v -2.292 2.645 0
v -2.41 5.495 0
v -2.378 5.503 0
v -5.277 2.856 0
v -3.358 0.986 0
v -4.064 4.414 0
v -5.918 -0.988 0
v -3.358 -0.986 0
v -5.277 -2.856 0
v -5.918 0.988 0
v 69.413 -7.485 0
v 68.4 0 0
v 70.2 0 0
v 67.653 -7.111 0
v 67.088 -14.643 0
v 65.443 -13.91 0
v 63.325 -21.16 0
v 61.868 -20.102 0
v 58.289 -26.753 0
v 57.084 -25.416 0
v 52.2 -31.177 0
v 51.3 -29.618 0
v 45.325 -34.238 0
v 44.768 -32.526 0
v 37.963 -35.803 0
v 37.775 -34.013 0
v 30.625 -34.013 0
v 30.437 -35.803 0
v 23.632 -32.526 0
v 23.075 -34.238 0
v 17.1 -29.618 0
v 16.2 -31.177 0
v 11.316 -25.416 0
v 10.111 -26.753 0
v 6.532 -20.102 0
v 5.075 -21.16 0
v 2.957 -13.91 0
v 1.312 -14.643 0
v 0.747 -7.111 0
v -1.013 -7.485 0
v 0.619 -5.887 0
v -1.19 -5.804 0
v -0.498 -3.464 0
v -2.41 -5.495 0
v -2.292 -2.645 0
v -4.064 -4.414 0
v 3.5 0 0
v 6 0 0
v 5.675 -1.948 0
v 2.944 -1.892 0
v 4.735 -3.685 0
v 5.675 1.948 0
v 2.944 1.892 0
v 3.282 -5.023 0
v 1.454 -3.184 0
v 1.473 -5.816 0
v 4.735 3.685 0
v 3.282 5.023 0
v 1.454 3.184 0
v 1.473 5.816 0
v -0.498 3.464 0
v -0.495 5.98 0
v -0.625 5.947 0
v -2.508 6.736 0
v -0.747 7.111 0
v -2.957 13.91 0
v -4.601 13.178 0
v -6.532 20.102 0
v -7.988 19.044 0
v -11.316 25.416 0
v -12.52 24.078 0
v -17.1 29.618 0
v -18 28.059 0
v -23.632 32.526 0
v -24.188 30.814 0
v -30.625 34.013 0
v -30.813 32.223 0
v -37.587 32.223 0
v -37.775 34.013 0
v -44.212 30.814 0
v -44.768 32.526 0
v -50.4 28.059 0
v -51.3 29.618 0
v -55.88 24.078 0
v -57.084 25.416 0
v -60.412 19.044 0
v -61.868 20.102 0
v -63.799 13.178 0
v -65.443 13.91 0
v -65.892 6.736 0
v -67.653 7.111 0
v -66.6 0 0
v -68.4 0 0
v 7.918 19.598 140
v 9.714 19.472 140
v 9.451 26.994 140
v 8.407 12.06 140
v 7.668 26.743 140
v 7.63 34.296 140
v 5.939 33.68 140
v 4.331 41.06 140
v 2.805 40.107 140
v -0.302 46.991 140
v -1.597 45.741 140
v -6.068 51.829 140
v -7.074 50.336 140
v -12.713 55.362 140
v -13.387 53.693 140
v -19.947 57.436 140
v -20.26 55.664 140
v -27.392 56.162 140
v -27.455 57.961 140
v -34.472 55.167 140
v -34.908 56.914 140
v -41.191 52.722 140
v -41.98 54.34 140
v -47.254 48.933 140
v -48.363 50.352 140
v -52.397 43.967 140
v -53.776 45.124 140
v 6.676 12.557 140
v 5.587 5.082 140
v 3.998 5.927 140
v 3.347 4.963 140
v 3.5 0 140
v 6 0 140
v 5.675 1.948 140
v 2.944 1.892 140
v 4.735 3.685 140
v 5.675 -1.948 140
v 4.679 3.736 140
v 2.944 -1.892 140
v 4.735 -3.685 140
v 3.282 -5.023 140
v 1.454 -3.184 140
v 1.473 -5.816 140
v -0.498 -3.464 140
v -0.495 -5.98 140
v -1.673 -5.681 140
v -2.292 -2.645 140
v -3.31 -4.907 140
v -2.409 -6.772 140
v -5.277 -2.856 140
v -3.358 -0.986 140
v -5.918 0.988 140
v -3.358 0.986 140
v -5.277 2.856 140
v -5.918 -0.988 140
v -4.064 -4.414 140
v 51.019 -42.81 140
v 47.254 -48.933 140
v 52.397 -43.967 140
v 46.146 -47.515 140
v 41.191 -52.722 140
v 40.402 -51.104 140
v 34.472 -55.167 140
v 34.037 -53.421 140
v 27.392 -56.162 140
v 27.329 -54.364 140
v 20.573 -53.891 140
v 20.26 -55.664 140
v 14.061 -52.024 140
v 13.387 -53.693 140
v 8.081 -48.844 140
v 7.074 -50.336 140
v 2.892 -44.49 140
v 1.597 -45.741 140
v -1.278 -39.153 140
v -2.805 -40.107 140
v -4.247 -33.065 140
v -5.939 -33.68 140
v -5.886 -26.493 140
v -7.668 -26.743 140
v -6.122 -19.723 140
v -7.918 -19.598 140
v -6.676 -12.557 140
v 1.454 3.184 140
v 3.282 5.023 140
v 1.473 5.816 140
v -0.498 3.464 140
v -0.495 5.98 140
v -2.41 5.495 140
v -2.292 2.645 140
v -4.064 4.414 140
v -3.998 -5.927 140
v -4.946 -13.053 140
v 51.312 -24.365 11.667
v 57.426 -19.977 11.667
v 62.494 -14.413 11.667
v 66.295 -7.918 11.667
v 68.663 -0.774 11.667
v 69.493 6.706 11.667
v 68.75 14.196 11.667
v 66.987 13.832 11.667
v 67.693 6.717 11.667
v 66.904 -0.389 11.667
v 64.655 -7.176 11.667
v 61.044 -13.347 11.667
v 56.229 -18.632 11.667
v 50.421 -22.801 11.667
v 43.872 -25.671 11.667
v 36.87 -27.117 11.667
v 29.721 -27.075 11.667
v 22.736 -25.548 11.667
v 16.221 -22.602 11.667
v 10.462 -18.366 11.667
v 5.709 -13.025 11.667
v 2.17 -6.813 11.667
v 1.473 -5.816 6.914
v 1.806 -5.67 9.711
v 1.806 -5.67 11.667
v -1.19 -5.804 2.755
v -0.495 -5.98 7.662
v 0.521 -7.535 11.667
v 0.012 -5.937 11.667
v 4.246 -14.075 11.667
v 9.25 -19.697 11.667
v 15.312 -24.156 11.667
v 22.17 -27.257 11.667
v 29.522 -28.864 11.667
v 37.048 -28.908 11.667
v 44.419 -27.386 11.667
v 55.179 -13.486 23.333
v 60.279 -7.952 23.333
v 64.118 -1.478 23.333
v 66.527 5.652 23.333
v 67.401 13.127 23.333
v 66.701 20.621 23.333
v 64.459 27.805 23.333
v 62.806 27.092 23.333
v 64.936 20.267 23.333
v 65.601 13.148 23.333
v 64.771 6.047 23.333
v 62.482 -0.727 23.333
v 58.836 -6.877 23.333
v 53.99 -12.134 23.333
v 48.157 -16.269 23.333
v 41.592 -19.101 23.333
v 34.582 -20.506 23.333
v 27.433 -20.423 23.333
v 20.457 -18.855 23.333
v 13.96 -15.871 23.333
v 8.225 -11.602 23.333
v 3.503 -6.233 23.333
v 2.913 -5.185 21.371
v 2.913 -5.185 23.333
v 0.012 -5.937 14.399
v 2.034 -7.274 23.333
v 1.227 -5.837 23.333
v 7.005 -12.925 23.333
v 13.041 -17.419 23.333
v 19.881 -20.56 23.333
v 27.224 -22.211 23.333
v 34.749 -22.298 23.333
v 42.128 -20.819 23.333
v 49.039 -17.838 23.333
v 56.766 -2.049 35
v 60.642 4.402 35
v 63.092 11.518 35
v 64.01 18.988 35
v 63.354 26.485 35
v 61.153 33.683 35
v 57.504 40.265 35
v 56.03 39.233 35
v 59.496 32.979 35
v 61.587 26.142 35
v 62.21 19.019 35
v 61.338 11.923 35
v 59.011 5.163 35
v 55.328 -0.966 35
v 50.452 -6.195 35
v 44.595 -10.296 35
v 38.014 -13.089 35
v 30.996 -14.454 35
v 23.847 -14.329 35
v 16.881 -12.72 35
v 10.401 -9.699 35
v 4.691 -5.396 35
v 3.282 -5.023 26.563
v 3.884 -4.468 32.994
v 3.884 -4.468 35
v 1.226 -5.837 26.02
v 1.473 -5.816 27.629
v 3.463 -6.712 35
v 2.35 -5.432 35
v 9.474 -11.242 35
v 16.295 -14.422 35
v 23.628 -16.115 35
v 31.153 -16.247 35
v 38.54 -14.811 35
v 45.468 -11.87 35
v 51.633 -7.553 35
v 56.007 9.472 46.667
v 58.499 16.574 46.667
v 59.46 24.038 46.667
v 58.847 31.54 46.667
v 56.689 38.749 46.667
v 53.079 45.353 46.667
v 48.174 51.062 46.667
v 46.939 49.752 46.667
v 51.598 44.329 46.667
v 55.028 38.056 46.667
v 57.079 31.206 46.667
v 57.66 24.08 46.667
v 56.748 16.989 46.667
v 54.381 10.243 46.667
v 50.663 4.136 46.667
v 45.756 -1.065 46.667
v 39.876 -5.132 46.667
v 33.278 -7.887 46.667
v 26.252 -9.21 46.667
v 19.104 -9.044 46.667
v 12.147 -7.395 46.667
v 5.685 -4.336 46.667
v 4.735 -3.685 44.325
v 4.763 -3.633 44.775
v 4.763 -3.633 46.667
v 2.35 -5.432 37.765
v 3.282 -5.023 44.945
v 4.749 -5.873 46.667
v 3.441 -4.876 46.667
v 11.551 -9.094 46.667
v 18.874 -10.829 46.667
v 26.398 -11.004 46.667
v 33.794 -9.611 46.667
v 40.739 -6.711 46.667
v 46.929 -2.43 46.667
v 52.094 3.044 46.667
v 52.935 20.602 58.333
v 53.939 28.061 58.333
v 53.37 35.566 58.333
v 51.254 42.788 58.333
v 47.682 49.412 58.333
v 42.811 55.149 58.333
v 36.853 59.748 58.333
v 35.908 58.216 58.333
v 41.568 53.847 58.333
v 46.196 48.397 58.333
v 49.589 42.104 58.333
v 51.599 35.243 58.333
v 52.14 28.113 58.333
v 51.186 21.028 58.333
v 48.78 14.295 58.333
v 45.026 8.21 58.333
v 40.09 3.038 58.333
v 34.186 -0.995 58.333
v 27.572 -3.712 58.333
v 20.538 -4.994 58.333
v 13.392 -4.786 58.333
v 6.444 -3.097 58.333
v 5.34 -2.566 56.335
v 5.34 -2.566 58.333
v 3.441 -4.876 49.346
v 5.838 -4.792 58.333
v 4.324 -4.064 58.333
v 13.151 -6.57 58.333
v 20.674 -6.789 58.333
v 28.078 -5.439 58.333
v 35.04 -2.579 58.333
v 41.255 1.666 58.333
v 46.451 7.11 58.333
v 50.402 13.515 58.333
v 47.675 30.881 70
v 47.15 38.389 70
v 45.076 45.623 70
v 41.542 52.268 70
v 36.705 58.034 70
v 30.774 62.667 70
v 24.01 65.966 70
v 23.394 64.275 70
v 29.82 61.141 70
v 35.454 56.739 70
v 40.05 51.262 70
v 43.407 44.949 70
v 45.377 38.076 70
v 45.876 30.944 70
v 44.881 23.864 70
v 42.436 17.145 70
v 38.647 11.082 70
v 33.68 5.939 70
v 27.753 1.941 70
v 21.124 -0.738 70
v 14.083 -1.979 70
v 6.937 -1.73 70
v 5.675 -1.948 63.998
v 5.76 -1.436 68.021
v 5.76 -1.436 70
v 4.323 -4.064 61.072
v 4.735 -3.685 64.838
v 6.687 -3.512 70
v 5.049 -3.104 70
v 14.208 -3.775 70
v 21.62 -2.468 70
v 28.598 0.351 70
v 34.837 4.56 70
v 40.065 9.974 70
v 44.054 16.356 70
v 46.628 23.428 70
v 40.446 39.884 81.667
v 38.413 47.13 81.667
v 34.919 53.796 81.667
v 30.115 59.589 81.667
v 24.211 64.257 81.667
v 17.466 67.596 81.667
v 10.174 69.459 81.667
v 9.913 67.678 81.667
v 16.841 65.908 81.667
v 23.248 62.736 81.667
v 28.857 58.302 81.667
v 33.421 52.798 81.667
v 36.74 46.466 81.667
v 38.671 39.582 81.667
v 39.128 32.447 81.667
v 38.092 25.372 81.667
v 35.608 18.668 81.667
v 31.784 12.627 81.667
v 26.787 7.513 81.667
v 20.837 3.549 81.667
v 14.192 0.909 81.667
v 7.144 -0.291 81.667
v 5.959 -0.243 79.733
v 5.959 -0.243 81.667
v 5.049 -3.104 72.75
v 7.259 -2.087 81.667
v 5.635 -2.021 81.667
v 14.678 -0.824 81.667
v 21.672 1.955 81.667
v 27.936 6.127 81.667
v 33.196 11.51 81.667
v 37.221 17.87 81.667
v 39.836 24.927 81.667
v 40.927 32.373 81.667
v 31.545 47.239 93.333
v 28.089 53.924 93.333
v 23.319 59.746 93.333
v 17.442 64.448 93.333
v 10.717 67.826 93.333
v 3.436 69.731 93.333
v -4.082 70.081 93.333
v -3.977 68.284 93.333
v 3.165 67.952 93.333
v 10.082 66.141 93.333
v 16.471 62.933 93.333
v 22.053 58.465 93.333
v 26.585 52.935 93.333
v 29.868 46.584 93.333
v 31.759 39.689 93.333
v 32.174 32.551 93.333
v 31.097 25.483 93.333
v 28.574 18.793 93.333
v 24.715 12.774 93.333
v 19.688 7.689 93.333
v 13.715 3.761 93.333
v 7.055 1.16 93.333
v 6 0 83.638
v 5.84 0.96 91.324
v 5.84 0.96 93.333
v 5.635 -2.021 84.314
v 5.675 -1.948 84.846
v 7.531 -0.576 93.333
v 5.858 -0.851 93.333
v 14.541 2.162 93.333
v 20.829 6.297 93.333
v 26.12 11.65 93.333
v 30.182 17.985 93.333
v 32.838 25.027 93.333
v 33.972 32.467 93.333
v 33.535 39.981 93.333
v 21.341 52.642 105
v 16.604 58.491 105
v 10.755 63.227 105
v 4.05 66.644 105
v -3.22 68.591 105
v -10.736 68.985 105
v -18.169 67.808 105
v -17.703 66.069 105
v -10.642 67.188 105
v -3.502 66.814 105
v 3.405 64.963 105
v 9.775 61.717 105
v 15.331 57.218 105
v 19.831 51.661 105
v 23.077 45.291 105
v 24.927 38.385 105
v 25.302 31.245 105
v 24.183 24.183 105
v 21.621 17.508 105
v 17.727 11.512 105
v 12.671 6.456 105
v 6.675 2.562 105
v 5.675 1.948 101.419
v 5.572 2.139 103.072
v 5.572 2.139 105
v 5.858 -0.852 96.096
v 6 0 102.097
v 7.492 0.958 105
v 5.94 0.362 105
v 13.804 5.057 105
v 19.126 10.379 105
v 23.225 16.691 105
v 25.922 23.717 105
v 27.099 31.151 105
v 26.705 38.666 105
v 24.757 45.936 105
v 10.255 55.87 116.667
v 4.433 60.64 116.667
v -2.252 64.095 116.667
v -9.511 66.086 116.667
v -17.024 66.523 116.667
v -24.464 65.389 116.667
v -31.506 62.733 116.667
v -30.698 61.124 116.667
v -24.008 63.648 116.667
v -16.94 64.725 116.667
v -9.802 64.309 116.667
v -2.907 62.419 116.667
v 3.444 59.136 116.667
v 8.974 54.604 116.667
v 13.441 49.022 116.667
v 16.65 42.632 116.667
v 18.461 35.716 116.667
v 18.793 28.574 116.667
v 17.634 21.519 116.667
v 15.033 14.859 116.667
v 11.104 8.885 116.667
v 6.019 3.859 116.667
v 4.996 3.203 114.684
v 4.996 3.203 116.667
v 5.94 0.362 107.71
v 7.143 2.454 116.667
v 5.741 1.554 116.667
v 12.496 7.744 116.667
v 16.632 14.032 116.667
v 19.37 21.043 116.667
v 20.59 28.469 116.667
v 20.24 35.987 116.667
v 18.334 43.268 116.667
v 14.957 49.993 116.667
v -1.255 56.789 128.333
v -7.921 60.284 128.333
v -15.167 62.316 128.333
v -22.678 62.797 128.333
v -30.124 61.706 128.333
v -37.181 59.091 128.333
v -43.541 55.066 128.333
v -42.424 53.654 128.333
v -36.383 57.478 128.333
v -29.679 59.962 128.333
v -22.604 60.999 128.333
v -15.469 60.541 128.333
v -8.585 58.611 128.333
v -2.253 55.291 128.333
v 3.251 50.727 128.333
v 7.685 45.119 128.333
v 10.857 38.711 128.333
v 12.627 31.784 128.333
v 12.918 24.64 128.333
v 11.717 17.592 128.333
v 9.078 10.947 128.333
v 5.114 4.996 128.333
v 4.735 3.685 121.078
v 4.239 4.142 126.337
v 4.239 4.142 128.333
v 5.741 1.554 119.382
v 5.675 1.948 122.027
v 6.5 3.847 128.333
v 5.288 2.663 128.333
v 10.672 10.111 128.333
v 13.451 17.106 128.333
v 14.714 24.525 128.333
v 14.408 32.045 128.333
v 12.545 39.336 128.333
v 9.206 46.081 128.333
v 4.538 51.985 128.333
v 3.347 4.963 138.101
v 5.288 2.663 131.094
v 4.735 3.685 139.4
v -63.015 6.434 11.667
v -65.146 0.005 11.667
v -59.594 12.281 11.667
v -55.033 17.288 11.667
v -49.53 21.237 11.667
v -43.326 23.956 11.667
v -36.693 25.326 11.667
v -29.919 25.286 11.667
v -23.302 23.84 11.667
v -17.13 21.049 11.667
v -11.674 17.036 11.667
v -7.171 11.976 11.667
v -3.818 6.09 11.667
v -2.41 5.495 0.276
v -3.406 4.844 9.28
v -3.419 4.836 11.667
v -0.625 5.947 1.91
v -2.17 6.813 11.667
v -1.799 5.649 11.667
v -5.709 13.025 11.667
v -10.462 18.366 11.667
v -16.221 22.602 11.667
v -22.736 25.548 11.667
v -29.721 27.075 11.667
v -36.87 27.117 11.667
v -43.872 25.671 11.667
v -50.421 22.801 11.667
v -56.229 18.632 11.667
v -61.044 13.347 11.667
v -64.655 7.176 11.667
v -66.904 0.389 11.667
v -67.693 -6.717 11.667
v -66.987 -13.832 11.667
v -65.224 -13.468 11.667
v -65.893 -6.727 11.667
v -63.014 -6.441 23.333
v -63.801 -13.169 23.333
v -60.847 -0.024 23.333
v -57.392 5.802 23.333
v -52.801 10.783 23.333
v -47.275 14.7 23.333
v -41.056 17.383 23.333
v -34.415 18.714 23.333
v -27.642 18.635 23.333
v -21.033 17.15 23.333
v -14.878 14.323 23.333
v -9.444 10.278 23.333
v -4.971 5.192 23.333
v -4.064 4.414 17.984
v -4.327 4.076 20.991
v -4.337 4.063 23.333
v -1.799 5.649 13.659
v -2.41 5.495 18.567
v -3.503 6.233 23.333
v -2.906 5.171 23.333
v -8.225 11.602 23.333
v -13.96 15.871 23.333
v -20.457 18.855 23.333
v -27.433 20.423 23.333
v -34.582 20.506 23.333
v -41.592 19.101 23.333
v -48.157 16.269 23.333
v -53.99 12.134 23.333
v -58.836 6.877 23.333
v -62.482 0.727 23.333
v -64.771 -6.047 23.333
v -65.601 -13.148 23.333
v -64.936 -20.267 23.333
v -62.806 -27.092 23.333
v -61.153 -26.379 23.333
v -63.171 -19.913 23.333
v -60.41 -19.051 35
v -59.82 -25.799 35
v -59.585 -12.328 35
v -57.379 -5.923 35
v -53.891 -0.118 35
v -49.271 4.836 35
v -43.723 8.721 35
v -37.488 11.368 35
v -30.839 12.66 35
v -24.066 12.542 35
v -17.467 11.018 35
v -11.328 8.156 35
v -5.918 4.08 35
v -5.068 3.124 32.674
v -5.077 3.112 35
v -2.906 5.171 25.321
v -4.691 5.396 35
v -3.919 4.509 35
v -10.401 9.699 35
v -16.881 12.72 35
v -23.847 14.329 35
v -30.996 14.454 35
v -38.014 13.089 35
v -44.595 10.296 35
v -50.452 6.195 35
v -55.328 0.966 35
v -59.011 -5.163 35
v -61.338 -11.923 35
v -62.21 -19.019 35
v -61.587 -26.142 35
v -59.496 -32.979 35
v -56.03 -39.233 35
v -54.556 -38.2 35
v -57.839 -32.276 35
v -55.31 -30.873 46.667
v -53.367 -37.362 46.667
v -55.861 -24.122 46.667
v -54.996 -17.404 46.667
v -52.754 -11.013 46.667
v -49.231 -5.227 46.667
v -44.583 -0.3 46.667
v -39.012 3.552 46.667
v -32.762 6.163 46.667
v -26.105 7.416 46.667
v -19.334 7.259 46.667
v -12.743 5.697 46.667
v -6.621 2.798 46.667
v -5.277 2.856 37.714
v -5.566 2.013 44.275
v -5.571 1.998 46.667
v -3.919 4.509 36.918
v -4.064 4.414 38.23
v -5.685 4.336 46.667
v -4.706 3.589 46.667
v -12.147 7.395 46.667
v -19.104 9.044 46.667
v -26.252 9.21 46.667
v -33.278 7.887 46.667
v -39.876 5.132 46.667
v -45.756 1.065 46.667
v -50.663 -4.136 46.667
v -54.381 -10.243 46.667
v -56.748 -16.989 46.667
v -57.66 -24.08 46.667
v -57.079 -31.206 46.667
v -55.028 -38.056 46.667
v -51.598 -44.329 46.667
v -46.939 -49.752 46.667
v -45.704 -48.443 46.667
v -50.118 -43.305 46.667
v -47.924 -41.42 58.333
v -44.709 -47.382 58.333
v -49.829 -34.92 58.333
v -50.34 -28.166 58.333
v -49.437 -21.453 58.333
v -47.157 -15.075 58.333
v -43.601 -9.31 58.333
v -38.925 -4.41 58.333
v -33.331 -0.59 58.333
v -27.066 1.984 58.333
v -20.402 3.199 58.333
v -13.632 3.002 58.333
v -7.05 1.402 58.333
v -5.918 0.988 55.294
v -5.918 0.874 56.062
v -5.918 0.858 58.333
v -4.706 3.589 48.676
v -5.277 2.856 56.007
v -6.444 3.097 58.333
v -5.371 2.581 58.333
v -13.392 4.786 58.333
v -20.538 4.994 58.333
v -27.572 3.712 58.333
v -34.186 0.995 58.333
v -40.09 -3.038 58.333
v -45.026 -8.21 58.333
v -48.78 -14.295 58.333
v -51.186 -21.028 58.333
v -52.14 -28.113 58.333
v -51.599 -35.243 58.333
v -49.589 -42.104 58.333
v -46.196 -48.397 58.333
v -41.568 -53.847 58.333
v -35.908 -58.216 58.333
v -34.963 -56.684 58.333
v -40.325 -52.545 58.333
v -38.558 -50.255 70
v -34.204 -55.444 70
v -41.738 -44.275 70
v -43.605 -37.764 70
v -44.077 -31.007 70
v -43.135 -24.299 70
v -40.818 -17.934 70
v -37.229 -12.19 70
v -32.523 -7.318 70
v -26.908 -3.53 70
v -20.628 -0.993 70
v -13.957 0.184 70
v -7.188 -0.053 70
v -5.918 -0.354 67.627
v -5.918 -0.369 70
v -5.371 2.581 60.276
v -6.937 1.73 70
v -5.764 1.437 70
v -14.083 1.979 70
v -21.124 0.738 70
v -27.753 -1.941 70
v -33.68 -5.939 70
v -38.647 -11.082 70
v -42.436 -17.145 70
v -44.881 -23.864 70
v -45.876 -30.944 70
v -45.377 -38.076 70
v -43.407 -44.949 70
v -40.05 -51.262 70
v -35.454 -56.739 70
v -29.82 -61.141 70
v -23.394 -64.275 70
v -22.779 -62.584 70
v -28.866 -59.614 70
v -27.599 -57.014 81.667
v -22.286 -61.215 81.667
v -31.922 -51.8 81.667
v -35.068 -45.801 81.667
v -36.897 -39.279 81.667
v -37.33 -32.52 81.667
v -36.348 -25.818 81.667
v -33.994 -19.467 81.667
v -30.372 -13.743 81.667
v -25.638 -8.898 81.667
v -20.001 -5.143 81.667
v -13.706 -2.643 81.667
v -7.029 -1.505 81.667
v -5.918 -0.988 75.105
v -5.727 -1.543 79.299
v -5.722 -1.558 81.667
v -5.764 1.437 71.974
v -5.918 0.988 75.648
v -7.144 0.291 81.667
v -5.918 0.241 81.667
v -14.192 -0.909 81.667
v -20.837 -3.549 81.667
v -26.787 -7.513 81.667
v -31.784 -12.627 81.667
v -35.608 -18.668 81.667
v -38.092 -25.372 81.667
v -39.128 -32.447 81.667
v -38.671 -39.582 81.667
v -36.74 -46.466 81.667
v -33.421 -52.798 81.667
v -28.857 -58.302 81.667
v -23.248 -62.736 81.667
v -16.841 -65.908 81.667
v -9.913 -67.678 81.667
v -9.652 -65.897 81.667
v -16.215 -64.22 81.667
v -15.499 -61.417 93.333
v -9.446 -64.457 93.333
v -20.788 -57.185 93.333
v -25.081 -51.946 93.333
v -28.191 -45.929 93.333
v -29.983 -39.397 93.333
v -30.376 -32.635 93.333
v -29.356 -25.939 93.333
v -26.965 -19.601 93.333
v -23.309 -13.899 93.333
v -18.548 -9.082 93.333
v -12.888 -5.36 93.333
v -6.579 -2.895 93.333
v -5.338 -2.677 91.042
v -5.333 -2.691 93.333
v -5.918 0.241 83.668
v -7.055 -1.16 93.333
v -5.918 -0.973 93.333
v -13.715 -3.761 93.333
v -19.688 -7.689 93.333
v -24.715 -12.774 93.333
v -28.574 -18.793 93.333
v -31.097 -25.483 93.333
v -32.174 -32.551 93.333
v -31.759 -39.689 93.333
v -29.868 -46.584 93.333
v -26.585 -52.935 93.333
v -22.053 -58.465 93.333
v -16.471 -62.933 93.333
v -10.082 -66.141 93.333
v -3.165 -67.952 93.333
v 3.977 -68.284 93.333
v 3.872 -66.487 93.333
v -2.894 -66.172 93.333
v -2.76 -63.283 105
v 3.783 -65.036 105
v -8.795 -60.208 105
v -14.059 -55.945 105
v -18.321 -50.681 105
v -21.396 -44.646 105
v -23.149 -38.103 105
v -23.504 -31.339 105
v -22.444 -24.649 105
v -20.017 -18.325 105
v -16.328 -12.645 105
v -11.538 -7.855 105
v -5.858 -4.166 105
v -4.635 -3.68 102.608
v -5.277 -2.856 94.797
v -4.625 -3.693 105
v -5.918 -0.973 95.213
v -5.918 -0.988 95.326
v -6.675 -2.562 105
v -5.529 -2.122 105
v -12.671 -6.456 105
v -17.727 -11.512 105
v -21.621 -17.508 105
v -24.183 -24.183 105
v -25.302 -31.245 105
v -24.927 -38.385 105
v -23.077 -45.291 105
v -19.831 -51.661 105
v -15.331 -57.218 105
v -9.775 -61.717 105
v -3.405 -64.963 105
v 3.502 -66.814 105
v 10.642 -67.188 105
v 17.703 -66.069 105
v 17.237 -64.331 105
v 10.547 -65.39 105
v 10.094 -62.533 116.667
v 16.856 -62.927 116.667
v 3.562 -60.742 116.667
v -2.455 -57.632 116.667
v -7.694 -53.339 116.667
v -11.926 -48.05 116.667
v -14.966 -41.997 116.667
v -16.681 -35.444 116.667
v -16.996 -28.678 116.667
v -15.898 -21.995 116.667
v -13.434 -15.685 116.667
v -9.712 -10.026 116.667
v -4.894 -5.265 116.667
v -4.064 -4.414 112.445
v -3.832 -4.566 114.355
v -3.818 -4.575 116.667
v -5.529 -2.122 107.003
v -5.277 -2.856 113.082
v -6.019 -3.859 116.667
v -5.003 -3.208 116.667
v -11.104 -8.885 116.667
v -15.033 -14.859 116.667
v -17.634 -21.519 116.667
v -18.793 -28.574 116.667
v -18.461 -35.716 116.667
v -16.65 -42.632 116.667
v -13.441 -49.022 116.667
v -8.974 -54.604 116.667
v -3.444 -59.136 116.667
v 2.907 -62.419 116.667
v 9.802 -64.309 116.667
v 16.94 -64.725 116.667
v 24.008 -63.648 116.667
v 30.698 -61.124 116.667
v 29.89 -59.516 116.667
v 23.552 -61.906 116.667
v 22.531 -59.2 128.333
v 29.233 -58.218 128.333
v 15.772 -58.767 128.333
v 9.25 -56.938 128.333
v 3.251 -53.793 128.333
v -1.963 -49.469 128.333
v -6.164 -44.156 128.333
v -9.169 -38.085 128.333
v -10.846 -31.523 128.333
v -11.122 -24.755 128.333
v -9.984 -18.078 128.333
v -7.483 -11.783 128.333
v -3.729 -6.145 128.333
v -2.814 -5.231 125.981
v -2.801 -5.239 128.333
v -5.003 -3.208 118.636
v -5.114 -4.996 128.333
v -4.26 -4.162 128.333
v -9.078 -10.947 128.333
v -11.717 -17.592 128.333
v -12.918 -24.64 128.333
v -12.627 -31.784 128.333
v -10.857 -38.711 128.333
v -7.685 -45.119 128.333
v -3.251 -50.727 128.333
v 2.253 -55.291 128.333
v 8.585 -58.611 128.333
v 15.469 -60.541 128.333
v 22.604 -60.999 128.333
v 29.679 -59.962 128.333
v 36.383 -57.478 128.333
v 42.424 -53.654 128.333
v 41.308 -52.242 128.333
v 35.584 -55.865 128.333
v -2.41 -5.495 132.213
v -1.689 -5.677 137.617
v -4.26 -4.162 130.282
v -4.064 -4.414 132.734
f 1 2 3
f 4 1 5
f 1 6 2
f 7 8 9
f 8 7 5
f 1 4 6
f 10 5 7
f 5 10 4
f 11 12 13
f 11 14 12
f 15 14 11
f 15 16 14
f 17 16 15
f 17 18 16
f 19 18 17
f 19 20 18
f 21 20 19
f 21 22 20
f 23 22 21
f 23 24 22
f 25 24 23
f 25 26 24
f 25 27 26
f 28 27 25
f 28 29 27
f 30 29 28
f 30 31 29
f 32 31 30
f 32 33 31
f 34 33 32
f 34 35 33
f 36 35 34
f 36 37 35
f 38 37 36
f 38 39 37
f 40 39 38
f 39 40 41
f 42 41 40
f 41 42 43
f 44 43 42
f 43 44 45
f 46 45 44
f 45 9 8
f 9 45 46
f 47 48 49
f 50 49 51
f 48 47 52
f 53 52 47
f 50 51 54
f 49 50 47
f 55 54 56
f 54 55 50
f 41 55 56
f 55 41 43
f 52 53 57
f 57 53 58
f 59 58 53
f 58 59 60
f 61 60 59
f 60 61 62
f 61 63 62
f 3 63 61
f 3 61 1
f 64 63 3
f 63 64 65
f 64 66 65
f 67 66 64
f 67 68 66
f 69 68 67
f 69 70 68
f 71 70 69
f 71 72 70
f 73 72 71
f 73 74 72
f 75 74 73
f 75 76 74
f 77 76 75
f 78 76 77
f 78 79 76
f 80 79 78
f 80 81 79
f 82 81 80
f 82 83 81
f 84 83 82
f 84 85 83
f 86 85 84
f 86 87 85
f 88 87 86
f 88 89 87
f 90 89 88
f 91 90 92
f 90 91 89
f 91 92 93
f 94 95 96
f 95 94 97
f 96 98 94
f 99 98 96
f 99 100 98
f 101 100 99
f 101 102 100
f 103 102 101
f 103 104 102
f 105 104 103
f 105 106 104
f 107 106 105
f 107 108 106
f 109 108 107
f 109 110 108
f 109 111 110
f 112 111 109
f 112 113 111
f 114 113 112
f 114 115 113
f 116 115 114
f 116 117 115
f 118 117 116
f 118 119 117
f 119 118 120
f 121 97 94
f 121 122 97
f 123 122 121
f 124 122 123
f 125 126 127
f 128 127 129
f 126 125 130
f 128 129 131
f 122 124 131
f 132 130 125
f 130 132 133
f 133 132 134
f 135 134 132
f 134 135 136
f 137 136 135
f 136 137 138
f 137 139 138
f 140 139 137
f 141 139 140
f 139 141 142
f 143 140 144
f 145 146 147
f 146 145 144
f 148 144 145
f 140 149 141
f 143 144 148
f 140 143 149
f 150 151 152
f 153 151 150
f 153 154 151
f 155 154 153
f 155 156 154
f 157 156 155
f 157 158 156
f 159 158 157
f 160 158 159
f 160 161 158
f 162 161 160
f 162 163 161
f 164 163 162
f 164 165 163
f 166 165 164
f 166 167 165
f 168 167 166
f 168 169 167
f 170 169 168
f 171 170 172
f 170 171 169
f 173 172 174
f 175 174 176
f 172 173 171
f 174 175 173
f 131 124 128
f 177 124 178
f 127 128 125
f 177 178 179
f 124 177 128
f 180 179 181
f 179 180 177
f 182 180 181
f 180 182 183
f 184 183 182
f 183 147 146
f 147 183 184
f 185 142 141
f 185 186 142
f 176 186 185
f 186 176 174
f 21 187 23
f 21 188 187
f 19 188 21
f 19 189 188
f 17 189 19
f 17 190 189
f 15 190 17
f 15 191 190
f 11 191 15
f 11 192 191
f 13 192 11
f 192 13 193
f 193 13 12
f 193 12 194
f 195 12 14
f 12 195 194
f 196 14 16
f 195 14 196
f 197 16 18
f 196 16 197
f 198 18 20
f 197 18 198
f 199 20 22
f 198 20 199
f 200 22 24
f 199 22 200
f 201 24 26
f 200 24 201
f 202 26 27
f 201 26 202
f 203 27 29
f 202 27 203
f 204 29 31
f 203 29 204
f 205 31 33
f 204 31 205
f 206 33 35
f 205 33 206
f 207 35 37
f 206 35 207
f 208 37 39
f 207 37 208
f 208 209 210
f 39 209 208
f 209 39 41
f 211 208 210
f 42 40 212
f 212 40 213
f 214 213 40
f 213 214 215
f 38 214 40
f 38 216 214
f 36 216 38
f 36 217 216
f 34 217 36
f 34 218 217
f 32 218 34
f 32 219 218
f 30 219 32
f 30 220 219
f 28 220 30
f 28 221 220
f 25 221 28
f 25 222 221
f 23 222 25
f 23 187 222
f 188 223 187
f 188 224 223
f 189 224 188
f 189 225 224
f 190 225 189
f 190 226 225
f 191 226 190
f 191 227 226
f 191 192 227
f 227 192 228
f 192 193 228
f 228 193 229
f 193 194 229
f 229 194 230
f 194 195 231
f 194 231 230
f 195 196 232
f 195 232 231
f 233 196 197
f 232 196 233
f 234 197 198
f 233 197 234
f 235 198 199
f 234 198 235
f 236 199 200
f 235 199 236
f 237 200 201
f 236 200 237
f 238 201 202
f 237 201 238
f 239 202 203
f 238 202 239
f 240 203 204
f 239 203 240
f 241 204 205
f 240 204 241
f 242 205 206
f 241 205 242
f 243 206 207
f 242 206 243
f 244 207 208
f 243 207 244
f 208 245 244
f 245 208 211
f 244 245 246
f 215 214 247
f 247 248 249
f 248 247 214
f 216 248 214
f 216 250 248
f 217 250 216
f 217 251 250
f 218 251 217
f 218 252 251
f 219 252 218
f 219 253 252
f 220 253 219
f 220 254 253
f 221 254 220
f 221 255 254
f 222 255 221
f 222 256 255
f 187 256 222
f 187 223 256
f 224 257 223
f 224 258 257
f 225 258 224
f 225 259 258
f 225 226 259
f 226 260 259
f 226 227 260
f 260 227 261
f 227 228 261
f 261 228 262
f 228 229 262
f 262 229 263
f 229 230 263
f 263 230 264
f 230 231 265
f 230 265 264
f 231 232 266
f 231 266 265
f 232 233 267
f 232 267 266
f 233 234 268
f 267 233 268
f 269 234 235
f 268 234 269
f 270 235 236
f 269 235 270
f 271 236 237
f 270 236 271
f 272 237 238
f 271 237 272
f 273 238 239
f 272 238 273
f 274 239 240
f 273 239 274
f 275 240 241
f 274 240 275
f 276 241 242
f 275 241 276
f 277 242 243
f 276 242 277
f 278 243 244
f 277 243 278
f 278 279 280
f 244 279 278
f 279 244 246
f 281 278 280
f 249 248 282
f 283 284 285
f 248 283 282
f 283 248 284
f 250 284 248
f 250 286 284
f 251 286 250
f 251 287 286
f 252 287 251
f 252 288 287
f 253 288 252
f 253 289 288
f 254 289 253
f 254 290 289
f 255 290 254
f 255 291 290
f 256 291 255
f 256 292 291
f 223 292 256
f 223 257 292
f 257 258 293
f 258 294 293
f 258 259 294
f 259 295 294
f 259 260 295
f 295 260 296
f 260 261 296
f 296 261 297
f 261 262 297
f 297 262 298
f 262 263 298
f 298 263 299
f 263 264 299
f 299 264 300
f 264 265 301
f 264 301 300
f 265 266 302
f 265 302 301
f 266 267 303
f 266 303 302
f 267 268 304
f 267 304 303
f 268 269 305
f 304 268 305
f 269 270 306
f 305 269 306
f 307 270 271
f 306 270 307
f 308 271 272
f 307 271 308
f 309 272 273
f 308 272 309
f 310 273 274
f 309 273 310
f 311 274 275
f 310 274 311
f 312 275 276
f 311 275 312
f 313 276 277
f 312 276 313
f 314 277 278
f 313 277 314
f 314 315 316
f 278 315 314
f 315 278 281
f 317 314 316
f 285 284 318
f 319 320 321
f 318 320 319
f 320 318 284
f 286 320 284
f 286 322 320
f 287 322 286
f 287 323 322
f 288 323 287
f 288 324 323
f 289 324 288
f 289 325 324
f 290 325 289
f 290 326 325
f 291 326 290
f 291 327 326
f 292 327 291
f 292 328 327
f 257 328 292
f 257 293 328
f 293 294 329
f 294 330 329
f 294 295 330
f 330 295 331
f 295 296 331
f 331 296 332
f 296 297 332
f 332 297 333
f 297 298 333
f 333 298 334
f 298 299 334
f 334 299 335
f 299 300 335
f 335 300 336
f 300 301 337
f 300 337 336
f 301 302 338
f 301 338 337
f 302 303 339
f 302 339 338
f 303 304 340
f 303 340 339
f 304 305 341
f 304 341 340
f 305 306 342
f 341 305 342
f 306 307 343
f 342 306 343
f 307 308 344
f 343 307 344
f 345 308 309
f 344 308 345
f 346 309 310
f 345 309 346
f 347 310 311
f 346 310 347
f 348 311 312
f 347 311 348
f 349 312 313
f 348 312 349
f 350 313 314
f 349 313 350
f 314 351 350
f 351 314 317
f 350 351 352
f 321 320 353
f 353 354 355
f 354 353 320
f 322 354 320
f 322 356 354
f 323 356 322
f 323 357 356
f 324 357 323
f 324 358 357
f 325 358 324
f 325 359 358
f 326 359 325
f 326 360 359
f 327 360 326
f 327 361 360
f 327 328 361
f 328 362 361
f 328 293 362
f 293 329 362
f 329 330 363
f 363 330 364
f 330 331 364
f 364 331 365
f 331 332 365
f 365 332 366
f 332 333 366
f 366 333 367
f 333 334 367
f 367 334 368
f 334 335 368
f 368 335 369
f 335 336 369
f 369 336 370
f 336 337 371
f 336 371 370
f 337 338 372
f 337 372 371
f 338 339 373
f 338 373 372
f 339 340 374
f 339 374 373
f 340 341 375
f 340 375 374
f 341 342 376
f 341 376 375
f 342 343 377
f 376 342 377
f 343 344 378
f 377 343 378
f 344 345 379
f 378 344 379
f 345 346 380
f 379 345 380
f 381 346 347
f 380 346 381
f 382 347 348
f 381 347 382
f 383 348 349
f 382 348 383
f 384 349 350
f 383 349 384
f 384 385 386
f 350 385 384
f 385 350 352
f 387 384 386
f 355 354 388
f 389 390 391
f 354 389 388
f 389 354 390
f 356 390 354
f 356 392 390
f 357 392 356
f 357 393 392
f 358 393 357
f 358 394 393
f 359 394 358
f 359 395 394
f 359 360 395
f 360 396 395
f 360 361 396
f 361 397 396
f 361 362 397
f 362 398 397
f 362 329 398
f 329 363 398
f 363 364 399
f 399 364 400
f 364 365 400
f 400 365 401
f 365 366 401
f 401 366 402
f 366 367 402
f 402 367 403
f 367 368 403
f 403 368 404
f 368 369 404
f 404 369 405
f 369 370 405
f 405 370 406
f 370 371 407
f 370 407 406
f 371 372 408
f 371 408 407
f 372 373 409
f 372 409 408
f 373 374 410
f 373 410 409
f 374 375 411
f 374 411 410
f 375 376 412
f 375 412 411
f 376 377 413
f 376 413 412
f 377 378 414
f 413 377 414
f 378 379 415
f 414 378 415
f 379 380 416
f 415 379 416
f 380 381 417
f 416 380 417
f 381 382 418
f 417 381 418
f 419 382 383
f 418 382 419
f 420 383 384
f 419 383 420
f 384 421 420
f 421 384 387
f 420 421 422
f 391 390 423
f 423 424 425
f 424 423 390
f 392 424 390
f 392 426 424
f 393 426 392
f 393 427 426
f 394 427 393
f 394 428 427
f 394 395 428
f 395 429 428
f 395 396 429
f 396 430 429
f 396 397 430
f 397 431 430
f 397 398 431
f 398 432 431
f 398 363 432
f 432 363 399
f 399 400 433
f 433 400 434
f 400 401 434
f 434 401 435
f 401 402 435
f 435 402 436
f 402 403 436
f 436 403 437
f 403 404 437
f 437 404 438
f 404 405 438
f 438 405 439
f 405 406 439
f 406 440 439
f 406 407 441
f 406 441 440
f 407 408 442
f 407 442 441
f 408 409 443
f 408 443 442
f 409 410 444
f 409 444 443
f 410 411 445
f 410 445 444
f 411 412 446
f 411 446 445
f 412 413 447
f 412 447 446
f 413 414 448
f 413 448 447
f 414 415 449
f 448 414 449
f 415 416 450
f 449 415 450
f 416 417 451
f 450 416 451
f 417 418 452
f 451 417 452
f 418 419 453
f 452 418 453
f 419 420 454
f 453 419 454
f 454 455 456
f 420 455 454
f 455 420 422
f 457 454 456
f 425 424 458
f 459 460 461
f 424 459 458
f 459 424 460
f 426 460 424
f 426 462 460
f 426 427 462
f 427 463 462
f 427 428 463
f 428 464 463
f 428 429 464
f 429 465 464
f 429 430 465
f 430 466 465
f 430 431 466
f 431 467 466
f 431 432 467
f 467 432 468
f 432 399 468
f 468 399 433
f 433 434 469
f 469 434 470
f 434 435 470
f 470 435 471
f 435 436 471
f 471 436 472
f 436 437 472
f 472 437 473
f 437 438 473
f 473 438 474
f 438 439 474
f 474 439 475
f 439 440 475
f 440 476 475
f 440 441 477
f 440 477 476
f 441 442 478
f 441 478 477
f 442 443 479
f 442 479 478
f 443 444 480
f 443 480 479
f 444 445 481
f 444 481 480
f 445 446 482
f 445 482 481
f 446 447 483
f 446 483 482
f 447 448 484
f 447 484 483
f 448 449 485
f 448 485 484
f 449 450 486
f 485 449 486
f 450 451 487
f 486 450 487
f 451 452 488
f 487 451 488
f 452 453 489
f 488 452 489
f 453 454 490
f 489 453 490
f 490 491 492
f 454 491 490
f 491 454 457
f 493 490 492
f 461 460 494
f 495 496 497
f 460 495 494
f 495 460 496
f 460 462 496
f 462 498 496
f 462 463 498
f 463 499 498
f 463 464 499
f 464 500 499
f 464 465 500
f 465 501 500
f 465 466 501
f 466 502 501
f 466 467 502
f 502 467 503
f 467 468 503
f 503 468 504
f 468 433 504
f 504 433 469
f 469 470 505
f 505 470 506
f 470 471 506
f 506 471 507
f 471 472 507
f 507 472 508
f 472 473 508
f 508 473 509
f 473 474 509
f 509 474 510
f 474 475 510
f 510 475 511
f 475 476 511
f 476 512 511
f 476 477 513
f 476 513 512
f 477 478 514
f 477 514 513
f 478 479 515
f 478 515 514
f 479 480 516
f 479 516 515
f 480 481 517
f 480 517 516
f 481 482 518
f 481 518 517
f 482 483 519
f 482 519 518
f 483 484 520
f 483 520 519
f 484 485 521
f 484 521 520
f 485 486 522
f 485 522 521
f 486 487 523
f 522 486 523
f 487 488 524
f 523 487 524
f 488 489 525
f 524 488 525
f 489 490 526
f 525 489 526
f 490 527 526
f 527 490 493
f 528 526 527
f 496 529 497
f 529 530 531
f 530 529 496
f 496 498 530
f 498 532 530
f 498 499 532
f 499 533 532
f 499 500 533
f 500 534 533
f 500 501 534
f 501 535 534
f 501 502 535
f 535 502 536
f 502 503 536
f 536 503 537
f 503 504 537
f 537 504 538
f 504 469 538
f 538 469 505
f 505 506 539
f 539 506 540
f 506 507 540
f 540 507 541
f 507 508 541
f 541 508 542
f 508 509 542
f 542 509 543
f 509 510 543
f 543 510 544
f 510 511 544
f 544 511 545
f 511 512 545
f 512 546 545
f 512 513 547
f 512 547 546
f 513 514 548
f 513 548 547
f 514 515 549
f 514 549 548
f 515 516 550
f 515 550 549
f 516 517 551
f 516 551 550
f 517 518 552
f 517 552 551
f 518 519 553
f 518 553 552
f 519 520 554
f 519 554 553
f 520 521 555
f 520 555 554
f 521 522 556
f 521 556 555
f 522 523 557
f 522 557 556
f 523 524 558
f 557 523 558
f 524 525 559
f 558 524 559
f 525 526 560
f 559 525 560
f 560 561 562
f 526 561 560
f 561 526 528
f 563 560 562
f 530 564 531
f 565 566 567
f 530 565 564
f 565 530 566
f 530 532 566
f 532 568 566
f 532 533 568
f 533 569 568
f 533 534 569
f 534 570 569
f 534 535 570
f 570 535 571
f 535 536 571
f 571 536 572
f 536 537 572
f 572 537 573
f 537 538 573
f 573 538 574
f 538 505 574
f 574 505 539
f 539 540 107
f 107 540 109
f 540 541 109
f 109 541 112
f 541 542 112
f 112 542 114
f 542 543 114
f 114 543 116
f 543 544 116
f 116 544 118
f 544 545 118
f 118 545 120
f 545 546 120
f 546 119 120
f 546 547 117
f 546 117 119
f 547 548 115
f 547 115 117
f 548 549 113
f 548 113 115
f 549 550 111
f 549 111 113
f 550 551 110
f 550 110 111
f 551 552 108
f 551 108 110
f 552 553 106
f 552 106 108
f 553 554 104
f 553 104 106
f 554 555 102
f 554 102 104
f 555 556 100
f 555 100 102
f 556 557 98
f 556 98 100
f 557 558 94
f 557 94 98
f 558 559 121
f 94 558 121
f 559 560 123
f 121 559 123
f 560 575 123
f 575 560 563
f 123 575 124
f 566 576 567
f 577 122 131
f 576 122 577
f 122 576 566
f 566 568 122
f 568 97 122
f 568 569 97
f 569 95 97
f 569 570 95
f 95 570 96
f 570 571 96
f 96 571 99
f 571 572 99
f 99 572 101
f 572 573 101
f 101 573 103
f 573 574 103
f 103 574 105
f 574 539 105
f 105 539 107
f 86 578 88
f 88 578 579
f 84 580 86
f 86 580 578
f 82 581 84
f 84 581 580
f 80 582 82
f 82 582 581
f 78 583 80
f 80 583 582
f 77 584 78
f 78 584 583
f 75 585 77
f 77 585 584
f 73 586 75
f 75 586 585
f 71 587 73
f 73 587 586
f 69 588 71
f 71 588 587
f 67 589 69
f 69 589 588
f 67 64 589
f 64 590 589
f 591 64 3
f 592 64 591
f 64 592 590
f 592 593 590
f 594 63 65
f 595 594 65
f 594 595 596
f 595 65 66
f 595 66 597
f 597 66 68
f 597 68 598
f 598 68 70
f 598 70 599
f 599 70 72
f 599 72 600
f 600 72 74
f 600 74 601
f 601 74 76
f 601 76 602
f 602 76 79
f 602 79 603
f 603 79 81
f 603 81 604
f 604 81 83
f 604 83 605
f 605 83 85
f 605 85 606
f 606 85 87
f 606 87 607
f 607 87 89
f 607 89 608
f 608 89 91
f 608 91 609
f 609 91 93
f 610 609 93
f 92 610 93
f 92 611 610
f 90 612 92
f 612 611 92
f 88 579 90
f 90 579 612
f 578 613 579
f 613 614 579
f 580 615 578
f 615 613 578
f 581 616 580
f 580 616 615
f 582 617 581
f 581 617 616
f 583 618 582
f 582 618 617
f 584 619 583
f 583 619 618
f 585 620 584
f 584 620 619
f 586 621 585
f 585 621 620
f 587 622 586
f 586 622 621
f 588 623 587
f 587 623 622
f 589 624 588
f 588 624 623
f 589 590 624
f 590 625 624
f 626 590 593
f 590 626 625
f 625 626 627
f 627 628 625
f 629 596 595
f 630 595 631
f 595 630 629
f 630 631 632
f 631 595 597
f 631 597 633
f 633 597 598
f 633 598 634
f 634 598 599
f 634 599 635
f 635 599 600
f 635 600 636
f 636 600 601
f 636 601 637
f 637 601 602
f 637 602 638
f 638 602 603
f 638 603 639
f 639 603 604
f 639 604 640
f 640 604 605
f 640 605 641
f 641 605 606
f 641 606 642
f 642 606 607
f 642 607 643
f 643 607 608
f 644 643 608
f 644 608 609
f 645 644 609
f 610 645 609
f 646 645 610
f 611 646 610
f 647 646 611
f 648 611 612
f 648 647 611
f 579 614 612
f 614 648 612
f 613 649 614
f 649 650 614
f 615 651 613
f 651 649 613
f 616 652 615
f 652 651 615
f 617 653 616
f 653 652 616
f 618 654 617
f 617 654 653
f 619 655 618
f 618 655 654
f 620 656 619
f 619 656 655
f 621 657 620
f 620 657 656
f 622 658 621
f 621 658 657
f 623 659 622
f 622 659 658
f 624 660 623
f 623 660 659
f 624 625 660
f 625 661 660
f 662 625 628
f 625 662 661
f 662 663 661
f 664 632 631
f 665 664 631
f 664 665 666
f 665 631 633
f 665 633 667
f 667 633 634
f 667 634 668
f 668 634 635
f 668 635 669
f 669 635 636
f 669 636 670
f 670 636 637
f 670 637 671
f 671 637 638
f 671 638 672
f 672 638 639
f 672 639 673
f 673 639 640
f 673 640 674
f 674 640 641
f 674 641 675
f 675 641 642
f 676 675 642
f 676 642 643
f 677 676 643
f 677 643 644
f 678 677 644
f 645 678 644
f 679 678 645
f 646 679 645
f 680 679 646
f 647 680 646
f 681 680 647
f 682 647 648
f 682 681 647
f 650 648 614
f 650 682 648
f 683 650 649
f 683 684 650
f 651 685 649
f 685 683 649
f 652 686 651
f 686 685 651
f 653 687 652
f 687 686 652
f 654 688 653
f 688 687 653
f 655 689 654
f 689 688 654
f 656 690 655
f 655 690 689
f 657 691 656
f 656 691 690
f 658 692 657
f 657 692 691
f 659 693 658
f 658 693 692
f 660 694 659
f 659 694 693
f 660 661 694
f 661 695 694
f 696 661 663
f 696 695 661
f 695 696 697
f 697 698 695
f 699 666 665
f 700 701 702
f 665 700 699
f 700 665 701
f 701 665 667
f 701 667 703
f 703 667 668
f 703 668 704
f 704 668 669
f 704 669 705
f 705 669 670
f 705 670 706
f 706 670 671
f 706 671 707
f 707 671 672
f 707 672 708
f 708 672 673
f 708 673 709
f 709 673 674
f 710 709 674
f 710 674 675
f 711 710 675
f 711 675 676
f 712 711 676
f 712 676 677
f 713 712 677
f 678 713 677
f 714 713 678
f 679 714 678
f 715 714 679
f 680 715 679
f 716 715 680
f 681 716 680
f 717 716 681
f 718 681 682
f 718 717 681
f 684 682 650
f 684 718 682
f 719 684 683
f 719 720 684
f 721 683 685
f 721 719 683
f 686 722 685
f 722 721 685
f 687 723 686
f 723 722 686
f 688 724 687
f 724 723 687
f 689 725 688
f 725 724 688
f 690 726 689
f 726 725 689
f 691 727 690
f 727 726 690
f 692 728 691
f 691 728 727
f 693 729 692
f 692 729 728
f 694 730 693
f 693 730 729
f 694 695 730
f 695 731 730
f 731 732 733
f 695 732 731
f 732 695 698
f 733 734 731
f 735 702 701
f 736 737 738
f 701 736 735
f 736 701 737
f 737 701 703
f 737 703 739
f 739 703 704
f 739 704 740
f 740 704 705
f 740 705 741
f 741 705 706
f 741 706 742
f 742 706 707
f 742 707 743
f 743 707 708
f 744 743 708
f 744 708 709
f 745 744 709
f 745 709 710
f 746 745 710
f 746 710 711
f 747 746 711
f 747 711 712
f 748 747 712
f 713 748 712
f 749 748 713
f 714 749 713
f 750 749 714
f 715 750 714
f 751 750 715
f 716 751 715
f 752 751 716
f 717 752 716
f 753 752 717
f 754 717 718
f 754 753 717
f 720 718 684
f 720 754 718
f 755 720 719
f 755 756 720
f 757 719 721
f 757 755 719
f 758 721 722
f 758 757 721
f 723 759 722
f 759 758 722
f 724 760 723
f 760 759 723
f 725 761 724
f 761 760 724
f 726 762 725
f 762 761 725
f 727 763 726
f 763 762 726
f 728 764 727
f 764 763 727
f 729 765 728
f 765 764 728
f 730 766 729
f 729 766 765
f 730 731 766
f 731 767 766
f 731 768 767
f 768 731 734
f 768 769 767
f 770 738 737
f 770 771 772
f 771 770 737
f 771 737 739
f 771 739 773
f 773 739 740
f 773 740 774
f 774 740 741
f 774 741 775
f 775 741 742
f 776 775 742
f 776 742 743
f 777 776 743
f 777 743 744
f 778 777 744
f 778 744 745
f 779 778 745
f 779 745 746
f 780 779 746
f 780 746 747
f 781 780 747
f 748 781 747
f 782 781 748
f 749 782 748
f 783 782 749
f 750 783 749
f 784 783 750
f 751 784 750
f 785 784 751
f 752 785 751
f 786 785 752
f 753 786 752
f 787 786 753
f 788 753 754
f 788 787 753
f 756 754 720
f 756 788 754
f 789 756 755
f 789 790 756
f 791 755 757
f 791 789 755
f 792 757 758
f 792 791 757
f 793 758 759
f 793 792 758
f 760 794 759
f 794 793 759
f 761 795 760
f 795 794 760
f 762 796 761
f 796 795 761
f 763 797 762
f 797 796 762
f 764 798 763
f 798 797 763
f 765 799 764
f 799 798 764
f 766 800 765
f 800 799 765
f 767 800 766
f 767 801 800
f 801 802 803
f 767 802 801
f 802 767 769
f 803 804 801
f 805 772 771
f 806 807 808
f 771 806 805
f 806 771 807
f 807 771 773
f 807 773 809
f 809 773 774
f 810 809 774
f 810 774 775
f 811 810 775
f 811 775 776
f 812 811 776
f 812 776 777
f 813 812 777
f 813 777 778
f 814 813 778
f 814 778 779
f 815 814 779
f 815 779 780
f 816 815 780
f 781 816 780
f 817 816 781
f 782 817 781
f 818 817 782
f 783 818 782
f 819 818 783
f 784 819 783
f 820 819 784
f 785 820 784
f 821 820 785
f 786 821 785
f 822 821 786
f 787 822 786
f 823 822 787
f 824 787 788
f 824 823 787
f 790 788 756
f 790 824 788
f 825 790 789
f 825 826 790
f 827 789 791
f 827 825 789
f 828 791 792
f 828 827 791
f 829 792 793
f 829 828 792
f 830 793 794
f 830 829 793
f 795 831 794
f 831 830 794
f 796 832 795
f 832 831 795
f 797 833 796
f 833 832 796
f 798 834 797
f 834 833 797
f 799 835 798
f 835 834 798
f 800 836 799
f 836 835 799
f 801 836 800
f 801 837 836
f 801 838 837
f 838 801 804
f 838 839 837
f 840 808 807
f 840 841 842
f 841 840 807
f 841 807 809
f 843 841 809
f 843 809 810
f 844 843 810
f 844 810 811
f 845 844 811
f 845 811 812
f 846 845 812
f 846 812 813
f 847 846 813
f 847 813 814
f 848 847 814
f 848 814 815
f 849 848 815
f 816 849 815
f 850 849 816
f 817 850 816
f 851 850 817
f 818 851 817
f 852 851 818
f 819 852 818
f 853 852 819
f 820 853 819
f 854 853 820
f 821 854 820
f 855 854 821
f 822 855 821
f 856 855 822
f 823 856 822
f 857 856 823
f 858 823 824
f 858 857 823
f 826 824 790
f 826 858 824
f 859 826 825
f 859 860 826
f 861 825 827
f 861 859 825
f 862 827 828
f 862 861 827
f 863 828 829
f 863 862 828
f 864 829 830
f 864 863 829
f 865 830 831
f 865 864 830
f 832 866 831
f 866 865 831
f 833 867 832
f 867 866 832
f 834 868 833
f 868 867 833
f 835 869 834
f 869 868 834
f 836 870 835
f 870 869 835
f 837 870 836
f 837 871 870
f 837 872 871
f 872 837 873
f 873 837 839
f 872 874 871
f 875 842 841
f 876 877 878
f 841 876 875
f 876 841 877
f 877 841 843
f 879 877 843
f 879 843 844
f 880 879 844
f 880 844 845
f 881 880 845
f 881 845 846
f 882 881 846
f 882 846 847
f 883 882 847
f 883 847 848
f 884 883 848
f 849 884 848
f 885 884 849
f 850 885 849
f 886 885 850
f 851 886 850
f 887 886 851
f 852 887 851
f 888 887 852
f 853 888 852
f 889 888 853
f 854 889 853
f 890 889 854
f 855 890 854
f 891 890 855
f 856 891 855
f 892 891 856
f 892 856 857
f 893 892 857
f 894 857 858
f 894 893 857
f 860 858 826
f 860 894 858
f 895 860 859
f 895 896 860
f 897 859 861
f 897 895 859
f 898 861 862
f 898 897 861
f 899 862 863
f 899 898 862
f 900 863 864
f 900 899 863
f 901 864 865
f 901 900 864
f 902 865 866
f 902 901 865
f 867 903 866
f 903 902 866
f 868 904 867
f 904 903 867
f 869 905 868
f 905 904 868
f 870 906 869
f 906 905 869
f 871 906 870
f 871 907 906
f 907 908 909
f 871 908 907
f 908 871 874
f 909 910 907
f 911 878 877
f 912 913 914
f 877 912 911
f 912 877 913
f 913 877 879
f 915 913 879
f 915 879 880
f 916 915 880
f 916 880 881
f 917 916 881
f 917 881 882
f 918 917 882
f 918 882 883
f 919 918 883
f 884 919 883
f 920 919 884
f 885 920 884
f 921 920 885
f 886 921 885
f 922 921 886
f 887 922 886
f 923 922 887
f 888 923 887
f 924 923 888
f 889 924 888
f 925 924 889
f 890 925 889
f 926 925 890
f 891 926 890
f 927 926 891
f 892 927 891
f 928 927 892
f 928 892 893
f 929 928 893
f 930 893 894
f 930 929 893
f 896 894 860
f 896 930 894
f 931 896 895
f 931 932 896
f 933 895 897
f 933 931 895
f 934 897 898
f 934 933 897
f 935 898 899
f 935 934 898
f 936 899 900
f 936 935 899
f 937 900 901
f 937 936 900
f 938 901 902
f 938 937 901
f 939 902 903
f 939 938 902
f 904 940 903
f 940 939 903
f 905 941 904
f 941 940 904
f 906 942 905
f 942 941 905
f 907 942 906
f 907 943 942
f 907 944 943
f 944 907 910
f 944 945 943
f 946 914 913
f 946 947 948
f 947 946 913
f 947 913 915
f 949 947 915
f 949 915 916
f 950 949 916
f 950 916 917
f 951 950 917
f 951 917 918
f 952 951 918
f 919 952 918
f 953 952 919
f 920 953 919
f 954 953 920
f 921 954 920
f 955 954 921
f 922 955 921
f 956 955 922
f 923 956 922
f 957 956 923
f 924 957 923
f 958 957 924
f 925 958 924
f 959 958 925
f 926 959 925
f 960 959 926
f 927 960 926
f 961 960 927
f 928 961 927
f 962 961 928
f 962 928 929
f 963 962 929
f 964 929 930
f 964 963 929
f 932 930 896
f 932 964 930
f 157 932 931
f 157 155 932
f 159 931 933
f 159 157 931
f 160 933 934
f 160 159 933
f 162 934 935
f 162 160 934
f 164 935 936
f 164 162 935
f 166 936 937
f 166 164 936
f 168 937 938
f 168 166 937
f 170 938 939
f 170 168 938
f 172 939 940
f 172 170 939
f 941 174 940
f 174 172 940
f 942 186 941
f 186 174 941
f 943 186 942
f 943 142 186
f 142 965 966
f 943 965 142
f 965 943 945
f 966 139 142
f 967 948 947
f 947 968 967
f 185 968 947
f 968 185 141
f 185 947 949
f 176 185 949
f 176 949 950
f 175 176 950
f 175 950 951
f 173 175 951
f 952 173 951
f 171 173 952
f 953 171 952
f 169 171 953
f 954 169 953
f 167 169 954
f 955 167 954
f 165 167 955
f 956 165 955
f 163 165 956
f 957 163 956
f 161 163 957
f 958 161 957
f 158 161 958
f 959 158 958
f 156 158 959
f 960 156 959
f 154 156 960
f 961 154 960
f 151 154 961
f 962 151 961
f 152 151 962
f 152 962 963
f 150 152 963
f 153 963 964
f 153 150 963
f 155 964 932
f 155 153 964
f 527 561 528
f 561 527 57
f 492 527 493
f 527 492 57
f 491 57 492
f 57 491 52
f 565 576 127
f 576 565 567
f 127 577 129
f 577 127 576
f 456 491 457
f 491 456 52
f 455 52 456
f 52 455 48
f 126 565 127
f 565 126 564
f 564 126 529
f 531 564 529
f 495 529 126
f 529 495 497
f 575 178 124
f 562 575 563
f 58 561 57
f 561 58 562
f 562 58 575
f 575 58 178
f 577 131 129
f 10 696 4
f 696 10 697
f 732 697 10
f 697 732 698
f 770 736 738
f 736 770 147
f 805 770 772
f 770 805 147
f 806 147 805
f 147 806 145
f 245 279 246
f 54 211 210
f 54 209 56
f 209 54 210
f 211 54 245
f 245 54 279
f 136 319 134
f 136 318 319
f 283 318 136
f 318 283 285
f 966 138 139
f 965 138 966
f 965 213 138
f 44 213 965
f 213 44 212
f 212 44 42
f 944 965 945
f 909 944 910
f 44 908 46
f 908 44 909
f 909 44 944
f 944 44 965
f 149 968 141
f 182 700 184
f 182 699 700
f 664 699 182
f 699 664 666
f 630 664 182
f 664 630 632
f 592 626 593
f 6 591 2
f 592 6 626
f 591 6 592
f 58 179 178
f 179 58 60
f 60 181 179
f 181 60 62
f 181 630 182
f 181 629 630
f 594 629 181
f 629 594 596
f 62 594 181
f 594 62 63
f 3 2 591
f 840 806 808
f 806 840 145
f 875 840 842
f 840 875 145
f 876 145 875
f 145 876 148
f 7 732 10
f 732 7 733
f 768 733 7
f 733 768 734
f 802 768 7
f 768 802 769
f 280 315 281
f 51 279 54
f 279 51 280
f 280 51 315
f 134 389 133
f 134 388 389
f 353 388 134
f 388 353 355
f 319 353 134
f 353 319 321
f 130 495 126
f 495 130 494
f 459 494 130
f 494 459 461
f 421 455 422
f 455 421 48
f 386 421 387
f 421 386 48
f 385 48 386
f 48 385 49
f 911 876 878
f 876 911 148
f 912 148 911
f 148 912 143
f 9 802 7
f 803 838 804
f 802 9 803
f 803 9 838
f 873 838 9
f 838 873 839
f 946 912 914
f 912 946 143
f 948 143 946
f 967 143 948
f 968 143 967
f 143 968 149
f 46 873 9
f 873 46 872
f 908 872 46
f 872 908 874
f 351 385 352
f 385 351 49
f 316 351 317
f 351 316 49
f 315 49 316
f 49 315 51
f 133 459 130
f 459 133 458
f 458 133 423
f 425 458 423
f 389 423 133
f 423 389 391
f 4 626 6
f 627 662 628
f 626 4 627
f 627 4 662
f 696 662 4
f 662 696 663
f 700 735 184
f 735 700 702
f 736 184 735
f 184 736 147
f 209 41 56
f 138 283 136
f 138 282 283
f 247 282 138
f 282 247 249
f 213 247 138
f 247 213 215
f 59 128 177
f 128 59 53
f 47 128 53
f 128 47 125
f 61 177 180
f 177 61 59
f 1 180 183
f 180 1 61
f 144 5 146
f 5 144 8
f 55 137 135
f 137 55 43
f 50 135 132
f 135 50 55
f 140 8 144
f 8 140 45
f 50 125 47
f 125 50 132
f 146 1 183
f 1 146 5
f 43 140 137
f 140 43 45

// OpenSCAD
//%cube([40,60,80]);
s1=1.8;

difference(){
	union() {
		translate([0,0,70]) union() {
			linear_extrude(height = 140, center = true, convexity = 10, twist = -140)
			translate([s1*19,s1*0,s1*0]) difference() {circle(s1*20); circle(s1*19); translate([-s1*20,0,0]) square(s1*40,s1*20);}
			
			linear_extrude(height = 140, center = true, convexity = 10, twist = -140)
			rotate(0,0,180) translate([-s1*19,s1*0,s1*0]) difference() {circle(s1*19); circle(s1*18); translate([-s1*20,-s1*40,s1*0]) square(s1*40,s1*20);}
		}
		
		//cylinder(5,s1*40,s1*40);
		cylinder(140,6,6);
	}
	
		
			for(i=[0:5]){
			rotate([0,0,i*60]) translate([s1*32,0,0]) cylinder(3,7.5,7.5);
			}

			cylinder(150,3.5,3.5);
		

	

}
